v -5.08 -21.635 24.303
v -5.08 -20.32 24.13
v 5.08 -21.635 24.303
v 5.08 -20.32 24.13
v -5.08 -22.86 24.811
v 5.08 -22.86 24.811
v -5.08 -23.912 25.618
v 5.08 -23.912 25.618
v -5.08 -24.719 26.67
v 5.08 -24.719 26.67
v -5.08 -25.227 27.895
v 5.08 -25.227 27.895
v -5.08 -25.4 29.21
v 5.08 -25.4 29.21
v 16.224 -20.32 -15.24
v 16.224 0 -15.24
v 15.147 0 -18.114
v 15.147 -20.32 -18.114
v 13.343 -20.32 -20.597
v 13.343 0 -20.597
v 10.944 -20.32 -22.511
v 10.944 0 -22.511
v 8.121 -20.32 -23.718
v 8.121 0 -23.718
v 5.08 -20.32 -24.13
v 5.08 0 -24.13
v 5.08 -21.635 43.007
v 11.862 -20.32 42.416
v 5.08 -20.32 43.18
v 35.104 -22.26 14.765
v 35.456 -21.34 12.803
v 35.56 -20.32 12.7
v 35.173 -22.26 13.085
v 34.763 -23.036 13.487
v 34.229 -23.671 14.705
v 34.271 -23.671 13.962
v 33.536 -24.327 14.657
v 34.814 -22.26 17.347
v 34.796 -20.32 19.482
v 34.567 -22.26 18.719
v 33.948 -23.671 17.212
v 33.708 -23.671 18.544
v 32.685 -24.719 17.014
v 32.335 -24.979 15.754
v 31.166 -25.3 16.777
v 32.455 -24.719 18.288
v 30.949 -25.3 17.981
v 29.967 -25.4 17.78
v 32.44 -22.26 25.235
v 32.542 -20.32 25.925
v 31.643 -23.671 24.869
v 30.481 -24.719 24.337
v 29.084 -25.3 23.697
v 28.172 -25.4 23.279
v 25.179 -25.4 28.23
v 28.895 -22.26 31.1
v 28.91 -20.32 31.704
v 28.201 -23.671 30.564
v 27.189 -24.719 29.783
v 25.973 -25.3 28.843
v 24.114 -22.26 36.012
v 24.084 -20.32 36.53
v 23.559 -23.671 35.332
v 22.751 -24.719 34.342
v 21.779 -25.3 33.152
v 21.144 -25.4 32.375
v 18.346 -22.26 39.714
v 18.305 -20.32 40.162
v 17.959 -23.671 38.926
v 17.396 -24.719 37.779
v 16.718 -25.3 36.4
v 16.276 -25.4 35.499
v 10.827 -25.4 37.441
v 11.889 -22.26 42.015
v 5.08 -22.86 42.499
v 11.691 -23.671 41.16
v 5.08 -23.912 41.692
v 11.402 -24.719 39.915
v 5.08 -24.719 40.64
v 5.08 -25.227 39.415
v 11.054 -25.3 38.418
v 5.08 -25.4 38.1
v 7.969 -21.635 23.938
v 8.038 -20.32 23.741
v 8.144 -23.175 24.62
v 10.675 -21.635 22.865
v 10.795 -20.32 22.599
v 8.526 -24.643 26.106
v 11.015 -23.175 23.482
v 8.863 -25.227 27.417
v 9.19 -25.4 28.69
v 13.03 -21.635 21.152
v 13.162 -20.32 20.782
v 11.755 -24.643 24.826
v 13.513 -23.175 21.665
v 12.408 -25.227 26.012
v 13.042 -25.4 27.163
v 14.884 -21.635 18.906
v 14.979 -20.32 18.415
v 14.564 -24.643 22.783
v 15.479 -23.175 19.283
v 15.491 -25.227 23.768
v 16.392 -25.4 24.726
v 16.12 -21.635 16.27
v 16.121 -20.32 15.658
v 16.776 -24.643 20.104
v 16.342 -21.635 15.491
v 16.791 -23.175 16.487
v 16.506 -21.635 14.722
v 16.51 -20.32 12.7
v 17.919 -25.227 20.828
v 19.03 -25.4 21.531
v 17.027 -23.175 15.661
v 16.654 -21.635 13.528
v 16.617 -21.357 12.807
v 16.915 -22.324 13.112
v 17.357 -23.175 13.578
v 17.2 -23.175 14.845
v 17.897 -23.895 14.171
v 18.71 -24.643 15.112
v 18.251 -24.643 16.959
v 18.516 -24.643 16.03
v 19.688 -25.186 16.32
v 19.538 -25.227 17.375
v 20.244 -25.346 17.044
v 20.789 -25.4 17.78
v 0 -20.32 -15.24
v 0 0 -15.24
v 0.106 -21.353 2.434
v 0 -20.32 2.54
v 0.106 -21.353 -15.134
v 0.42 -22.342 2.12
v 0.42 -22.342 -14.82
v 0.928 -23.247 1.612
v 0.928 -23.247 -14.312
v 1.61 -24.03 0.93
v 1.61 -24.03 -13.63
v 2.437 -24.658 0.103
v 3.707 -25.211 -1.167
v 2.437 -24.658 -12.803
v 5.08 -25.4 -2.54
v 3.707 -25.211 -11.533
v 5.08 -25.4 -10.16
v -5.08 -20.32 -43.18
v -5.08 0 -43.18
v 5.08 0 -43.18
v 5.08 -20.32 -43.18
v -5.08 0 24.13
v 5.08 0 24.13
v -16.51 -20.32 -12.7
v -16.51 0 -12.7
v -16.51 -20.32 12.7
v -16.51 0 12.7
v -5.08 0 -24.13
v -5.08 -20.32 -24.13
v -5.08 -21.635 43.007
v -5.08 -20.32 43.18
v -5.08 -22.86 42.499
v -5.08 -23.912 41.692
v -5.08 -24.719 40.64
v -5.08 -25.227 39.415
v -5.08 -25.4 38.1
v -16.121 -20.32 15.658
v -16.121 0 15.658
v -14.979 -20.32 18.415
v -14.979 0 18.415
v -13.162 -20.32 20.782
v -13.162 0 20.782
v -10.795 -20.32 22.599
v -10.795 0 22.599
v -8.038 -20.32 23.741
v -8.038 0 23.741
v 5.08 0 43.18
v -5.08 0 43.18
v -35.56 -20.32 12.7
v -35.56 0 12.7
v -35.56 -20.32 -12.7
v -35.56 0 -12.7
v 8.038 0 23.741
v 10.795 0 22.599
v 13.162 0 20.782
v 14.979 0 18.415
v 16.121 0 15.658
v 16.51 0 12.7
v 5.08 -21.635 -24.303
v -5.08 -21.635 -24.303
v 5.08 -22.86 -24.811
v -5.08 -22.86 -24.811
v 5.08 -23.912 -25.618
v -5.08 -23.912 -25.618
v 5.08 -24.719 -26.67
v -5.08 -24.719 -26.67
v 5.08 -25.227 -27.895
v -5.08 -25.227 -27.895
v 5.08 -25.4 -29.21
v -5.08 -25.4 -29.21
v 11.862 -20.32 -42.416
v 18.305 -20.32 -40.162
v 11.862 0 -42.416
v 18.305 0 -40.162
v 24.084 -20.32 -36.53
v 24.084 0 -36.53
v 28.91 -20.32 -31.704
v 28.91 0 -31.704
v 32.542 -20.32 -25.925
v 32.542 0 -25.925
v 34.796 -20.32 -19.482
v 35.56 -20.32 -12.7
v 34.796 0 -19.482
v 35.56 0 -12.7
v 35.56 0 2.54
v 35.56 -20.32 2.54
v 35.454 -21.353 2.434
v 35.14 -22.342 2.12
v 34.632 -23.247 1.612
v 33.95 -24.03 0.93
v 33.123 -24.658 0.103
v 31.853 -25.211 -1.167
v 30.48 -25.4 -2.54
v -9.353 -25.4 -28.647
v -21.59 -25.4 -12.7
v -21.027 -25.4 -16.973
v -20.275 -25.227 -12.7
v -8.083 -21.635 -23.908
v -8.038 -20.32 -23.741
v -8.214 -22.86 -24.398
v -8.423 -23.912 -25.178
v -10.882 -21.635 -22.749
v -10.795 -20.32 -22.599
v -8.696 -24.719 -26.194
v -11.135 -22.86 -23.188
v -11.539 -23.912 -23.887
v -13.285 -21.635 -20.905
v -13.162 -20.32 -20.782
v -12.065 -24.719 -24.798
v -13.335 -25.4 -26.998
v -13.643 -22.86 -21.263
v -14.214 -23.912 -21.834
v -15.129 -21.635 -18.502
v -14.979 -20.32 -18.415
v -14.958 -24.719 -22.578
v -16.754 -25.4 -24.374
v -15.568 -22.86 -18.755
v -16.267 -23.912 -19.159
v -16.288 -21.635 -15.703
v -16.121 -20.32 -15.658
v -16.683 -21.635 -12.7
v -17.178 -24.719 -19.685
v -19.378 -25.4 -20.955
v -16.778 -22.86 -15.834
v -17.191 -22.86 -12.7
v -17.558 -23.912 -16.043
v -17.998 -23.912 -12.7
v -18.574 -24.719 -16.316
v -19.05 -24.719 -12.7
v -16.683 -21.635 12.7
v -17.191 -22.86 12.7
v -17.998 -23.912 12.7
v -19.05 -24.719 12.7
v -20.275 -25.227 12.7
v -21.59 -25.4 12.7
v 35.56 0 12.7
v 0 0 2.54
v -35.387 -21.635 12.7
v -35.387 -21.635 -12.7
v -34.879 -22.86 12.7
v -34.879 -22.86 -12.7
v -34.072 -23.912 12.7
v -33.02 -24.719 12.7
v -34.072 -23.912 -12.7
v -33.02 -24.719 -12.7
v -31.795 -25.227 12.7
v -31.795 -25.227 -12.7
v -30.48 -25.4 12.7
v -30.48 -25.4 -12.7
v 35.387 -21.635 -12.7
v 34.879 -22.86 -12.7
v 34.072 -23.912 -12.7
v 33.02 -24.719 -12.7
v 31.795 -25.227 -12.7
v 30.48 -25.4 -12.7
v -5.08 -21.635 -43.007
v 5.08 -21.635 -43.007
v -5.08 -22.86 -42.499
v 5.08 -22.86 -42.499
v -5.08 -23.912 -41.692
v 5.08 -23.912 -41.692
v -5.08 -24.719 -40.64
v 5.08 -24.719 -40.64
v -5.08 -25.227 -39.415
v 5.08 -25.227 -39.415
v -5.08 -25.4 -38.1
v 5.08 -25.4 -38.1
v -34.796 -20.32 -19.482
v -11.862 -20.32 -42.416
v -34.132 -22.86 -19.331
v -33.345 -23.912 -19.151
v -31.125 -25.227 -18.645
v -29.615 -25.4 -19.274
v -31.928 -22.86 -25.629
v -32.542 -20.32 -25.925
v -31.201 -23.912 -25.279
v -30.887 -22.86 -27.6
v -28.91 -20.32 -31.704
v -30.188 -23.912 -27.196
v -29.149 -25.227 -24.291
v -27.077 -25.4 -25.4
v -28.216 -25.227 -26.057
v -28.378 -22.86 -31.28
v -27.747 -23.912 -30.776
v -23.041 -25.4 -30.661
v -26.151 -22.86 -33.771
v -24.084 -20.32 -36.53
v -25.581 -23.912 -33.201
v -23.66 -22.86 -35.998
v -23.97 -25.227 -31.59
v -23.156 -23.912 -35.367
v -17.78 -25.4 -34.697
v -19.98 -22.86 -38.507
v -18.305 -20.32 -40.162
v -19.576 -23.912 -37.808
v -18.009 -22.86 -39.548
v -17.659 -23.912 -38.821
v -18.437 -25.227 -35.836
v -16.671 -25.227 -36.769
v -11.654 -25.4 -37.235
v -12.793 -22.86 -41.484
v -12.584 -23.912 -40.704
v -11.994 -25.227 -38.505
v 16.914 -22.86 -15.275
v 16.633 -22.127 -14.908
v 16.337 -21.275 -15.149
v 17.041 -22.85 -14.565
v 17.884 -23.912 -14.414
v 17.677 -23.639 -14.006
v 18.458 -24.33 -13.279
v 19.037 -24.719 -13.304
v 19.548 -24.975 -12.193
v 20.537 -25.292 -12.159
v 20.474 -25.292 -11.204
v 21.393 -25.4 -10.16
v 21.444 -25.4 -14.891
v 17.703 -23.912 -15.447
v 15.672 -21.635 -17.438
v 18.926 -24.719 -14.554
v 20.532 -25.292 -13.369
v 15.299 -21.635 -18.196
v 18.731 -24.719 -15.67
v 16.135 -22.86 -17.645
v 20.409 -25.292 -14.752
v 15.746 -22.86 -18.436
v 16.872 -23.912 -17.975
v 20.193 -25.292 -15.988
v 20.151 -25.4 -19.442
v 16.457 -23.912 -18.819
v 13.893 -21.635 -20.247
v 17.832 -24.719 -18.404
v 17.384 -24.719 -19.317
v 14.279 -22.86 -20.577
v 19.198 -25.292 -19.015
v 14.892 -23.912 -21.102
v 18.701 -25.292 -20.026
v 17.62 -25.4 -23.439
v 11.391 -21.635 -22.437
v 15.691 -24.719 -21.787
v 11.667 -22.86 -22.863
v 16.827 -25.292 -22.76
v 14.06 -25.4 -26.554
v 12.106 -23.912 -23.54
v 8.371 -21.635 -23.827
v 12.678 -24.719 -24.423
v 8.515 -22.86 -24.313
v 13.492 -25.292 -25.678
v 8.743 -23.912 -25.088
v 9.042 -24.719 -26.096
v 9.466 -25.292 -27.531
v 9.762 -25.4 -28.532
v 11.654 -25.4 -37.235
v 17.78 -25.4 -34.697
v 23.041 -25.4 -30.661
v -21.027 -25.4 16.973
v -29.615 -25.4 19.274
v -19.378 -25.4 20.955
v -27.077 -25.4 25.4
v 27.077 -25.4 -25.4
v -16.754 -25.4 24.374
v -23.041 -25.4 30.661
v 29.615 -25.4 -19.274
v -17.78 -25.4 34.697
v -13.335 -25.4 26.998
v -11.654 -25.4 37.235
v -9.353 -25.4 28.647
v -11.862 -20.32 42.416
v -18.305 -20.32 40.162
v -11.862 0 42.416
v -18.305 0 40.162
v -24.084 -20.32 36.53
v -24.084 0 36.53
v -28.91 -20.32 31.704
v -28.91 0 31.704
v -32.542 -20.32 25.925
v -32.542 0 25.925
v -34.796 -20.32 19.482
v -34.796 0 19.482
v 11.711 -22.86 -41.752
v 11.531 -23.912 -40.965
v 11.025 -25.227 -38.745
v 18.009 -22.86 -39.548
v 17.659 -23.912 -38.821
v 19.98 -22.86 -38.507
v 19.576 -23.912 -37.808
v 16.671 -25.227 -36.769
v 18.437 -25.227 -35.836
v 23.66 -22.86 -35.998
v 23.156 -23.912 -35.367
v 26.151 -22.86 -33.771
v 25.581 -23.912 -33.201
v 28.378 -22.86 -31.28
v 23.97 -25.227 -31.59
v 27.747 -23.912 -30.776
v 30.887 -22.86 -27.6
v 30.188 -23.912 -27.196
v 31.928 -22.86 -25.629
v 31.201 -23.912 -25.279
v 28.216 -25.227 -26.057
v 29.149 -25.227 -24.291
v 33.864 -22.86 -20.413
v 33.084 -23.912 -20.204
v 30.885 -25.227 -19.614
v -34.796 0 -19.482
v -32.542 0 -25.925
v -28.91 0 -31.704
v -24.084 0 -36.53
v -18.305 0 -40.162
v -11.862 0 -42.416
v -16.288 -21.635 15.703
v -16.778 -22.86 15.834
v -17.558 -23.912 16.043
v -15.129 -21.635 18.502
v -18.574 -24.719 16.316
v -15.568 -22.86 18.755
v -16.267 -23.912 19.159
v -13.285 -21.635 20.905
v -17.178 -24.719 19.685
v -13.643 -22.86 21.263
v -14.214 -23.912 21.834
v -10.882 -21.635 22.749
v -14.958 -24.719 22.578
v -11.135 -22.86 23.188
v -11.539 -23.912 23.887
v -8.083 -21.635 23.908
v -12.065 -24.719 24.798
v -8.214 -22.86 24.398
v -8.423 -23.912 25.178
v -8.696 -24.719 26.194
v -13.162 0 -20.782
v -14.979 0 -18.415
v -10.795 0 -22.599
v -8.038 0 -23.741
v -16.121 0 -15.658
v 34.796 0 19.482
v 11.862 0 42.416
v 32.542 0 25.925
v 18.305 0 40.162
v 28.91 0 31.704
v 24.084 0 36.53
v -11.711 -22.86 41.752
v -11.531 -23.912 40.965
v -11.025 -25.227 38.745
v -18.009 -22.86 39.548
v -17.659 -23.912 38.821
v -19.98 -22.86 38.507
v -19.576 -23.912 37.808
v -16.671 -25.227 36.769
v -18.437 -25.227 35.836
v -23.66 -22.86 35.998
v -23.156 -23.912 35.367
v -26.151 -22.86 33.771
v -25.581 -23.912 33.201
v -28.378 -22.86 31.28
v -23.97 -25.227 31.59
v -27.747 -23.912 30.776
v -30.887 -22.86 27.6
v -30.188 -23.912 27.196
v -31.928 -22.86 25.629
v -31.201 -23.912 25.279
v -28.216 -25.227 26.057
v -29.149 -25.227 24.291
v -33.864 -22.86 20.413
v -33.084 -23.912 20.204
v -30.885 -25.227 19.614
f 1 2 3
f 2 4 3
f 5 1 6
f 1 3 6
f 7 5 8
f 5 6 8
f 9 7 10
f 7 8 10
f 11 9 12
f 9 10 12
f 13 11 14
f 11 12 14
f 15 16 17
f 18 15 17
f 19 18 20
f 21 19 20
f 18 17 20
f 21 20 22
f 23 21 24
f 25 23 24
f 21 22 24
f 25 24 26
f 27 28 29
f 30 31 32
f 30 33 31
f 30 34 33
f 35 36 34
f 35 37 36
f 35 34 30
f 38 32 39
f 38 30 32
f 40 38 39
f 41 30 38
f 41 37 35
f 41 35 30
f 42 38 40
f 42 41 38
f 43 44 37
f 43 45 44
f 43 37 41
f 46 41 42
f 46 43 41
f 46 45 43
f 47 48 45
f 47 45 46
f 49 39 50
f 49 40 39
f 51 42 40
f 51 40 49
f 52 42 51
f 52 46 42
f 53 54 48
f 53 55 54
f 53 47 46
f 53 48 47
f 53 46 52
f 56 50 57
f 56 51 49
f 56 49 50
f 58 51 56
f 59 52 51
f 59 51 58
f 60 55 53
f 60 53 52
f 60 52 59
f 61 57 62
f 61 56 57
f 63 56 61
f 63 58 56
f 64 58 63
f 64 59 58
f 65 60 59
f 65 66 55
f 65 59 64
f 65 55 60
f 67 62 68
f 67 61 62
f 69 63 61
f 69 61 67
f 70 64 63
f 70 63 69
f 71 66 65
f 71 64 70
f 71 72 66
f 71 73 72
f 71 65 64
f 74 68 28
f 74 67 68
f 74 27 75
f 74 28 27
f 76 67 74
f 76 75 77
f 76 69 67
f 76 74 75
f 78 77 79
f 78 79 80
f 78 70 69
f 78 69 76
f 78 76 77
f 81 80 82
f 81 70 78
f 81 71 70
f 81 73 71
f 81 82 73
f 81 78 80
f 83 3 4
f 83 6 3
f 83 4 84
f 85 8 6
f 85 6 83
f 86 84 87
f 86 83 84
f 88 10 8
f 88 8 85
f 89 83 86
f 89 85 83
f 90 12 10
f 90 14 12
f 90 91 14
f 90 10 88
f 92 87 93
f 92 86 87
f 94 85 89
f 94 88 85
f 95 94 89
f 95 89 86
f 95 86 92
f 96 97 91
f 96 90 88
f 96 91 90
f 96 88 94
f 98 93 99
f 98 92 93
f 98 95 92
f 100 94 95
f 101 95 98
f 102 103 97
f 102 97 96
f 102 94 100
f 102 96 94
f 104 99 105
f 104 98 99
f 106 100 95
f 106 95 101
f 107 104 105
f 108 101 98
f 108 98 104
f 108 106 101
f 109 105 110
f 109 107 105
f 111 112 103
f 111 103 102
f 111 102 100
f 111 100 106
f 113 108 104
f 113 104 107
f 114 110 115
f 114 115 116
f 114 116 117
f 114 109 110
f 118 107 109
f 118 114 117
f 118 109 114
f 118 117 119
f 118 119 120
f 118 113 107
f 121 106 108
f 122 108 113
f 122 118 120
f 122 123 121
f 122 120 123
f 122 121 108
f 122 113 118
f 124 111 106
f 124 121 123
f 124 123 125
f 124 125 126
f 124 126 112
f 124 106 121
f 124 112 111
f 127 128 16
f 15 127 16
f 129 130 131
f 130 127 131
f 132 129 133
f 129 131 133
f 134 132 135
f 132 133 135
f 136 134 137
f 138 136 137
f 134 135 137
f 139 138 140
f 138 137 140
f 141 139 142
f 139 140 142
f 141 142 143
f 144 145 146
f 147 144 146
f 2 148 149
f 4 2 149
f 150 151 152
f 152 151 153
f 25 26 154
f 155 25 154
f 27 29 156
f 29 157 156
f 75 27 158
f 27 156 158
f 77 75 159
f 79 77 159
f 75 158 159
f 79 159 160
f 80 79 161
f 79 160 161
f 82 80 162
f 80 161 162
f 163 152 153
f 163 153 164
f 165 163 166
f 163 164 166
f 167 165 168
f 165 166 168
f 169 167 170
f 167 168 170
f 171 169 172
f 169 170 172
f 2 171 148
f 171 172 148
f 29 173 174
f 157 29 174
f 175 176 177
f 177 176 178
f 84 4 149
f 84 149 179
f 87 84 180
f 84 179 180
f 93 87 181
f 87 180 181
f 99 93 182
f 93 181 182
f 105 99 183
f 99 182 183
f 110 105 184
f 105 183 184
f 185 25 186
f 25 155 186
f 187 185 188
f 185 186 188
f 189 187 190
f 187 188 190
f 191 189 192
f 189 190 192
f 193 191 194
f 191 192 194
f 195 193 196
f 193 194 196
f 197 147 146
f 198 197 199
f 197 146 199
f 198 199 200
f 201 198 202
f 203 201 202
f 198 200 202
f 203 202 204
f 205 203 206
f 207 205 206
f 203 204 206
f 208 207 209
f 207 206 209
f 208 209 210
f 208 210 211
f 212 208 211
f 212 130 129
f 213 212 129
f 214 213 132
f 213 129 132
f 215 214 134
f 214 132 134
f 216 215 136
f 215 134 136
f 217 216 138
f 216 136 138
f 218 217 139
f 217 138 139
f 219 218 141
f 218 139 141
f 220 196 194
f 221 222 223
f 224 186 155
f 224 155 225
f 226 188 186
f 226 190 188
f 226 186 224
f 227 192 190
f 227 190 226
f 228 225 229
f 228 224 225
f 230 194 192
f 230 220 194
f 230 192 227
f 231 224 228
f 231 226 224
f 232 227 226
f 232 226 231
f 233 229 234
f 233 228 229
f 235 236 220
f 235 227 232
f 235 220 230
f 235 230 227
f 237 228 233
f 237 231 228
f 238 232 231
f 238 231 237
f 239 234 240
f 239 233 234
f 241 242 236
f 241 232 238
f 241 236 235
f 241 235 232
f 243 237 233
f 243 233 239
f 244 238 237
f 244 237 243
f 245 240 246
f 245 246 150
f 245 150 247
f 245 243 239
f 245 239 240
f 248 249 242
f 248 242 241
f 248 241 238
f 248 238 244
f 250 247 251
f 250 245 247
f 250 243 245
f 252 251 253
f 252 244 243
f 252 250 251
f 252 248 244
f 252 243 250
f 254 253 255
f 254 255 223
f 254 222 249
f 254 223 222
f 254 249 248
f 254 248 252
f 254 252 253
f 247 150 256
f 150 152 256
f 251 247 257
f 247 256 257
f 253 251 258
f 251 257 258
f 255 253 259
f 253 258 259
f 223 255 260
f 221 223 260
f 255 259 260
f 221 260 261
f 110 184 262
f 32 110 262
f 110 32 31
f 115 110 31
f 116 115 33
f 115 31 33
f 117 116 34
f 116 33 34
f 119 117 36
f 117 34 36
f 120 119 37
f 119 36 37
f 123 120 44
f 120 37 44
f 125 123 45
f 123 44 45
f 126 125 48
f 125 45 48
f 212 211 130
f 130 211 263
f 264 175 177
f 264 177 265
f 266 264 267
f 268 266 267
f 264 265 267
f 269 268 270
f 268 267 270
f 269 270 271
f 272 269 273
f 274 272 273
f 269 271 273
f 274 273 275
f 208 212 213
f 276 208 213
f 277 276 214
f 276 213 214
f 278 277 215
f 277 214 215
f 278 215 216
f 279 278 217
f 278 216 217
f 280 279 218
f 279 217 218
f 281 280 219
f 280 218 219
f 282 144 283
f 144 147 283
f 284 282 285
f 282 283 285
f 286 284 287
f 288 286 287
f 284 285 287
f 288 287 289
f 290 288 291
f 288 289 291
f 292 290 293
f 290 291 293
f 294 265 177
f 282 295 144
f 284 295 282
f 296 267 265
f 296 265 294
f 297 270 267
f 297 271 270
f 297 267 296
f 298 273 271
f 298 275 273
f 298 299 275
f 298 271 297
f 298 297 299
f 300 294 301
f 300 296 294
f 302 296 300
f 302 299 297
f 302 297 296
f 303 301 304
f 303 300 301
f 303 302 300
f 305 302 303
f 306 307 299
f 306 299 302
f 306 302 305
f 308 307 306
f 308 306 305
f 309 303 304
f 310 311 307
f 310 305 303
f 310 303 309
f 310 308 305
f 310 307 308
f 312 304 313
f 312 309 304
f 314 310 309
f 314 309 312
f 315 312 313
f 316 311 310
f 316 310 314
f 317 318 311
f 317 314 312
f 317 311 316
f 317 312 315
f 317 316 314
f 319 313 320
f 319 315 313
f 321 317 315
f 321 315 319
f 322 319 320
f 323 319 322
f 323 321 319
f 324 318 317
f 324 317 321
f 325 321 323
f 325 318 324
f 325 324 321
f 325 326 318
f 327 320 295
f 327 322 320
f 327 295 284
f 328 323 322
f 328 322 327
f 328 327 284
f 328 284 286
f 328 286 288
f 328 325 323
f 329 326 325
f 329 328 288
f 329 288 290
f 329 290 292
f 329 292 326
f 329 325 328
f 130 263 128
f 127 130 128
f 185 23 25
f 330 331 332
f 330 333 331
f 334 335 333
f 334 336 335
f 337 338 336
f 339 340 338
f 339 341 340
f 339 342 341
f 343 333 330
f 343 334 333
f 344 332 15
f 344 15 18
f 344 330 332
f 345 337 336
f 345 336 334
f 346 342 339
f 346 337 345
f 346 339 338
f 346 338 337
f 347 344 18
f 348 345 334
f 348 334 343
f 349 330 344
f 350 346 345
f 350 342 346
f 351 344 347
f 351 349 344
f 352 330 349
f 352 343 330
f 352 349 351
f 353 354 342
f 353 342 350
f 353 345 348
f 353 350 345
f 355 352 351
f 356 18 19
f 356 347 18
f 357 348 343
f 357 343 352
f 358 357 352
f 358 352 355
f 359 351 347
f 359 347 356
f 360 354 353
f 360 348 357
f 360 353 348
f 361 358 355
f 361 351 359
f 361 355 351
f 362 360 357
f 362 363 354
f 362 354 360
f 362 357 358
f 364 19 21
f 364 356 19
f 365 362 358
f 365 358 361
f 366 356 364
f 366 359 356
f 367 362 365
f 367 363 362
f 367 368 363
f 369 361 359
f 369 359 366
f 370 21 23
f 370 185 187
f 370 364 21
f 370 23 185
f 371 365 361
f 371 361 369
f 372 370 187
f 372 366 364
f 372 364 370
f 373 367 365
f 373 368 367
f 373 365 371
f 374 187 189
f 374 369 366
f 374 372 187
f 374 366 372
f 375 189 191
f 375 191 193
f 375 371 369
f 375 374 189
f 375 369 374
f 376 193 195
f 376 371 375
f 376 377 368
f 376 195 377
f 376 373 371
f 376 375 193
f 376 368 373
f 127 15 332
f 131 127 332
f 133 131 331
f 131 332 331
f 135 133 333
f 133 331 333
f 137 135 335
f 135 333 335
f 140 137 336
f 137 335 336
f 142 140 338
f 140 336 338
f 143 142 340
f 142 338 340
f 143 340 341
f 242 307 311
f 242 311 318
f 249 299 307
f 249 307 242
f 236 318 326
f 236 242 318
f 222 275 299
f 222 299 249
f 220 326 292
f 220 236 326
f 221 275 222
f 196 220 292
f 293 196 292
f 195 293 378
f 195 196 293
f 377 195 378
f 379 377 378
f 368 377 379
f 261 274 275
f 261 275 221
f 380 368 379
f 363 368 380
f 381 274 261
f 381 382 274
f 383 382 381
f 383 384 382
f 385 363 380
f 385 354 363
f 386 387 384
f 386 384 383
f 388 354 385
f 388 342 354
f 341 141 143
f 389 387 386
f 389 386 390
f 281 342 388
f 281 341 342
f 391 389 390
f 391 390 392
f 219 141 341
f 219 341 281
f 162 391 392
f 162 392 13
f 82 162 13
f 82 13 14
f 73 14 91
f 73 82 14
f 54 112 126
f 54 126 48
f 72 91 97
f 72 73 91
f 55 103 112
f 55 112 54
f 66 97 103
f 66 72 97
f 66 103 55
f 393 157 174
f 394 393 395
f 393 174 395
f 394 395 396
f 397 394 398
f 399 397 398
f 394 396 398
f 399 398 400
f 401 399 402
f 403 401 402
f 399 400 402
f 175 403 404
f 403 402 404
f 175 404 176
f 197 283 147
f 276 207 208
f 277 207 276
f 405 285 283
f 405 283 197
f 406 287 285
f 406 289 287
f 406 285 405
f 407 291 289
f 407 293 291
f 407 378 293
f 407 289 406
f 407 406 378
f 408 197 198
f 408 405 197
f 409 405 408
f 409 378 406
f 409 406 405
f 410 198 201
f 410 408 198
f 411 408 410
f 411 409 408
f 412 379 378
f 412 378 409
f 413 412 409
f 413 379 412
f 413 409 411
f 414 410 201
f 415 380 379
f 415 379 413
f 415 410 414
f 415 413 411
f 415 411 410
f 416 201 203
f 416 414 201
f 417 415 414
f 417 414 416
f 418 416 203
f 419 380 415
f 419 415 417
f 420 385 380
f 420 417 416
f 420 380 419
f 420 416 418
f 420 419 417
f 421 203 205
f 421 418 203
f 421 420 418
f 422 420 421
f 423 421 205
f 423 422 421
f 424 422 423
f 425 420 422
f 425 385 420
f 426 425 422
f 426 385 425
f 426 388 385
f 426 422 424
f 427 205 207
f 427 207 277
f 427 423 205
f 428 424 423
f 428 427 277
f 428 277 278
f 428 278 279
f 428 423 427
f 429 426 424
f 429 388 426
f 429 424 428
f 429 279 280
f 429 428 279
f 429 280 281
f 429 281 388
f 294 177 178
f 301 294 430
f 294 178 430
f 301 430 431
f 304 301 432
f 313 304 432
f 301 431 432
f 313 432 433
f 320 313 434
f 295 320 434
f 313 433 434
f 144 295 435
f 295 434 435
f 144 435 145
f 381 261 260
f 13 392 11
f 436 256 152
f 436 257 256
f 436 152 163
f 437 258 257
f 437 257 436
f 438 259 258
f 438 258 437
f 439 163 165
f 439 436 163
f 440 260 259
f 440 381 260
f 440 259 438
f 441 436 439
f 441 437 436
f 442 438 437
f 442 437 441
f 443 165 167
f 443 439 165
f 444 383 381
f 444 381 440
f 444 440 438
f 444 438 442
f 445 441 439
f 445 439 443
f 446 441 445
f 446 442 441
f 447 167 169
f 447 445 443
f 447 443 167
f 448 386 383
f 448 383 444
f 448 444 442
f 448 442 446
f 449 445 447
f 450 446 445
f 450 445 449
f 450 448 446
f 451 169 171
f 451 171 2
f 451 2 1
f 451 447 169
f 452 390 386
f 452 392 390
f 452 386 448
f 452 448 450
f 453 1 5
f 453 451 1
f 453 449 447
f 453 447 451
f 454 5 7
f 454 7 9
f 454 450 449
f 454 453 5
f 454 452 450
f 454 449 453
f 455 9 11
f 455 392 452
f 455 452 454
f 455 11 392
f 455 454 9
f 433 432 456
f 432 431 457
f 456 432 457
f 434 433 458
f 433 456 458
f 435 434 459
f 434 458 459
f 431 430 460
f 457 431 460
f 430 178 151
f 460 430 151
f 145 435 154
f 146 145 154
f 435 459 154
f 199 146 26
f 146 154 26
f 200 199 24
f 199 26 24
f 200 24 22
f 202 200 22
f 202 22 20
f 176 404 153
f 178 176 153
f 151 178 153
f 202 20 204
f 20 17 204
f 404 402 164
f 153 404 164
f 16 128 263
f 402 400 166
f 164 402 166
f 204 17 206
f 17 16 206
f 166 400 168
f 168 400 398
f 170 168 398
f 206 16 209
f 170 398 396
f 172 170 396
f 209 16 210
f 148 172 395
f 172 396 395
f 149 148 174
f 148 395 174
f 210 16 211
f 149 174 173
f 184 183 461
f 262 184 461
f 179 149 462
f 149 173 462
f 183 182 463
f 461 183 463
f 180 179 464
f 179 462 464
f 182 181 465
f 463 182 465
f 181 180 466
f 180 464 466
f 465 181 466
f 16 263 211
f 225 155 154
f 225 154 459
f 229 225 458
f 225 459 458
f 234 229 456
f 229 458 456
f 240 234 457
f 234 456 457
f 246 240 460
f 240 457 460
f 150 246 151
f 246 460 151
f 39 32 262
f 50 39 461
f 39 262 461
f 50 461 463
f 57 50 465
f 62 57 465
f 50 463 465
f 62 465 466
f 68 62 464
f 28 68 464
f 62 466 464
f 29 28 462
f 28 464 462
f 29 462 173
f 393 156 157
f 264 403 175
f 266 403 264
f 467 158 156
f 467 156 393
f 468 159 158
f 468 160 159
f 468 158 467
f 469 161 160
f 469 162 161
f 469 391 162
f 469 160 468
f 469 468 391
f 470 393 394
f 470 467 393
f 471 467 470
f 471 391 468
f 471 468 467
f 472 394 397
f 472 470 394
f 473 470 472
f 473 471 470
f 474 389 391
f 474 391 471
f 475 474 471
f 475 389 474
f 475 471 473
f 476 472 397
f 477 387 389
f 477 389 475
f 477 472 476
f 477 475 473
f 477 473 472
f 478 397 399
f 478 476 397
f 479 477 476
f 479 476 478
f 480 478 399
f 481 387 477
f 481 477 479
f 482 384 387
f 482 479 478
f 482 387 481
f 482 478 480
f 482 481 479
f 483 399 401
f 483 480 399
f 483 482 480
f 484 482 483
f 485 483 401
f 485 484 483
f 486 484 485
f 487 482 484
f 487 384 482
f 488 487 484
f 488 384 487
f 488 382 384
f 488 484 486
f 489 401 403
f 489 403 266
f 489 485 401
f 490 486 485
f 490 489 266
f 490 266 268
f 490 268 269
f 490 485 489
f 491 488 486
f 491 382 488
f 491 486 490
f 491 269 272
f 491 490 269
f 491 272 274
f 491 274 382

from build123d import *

# Parameters (mm, degrees)
F1_DEPTH = 25.4
F2_R     = 5.08


with BuildPart() as f1:
    # F0 (on Front) → F1 (new body)
    with BuildSketch(Plane.XZ):
        with BuildLine():
            Line((5.08, 43.18), (-5.08, 43.18))
            ThreePointArc((-5.08, 43.18), (-26.632615, 34.252615), (-35.56, 12.7))
            Line((-35.56, 12.7), (-35.56, -12.7))
            ThreePointArc((-35.56, -12.7), (-26.632615, -34.252615), (-5.08, -43.18))
            Line((-5.08, -43.18), (5.08, -43.18))
            ThreePointArc((5.08, -43.18), (26.632615, -34.252615), (35.56, -12.7))
            Line((35.56, -12.7), (35.56, 0))
            Line((35.56, 0), (35.56, 2.54))
            Line((35.56, 2.54), (0, 2.54))
            Line((0, 2.54), (0, 0))
            Line((0, 0), (0, -12.7))
            Line((0, -12.7), (0, -15.24))
            Line((0, -15.24), (16.224205, -15.24))
            ThreePointArc((16.224205, -15.24), (12.207857, -21.635242), (5.08, -24.13))
            Line((5.08, -24.13), (-5.08, -24.13))
            ThreePointArc((-5.08, -24.13), (-13.162231, -20.782231), (-16.51, -12.7))
            Line((-16.51, -12.7), (-16.51, 12.7))
            ThreePointArc((-16.51, 12.7), (-13.162231, 20.782231), (-5.08, 24.13))
            Line((-5.08, 24.13), (5.08, 24.13))
            ThreePointArc((5.08, 24.13), (13.162231, 20.782231), (16.51, 12.7))
            Line((16.51, 12.7), (35.56, 12.7))
            ThreePointArc((35.56, 12.7), (26.632615, 34.252615), (5.08, 43.18))
        make_face()
    extrude(amount=F1_DEPTH)

    # F2
    f2_edges = [f1.edges().sort_by_distance(p)[0] for p in [
        (26.632615, -25.4, 34.252615),
        (-13.162231, -25.4, -20.782231),
        (8.112102, -25.4, -15.24),
        (0, -25.4, -6.35),
        (17.78, -25.4, 2.54),
        (26.035, -25.4, 12.7),
    ]]
    fillet(f2_edges, radius=F2_R)


solid = f1.part
